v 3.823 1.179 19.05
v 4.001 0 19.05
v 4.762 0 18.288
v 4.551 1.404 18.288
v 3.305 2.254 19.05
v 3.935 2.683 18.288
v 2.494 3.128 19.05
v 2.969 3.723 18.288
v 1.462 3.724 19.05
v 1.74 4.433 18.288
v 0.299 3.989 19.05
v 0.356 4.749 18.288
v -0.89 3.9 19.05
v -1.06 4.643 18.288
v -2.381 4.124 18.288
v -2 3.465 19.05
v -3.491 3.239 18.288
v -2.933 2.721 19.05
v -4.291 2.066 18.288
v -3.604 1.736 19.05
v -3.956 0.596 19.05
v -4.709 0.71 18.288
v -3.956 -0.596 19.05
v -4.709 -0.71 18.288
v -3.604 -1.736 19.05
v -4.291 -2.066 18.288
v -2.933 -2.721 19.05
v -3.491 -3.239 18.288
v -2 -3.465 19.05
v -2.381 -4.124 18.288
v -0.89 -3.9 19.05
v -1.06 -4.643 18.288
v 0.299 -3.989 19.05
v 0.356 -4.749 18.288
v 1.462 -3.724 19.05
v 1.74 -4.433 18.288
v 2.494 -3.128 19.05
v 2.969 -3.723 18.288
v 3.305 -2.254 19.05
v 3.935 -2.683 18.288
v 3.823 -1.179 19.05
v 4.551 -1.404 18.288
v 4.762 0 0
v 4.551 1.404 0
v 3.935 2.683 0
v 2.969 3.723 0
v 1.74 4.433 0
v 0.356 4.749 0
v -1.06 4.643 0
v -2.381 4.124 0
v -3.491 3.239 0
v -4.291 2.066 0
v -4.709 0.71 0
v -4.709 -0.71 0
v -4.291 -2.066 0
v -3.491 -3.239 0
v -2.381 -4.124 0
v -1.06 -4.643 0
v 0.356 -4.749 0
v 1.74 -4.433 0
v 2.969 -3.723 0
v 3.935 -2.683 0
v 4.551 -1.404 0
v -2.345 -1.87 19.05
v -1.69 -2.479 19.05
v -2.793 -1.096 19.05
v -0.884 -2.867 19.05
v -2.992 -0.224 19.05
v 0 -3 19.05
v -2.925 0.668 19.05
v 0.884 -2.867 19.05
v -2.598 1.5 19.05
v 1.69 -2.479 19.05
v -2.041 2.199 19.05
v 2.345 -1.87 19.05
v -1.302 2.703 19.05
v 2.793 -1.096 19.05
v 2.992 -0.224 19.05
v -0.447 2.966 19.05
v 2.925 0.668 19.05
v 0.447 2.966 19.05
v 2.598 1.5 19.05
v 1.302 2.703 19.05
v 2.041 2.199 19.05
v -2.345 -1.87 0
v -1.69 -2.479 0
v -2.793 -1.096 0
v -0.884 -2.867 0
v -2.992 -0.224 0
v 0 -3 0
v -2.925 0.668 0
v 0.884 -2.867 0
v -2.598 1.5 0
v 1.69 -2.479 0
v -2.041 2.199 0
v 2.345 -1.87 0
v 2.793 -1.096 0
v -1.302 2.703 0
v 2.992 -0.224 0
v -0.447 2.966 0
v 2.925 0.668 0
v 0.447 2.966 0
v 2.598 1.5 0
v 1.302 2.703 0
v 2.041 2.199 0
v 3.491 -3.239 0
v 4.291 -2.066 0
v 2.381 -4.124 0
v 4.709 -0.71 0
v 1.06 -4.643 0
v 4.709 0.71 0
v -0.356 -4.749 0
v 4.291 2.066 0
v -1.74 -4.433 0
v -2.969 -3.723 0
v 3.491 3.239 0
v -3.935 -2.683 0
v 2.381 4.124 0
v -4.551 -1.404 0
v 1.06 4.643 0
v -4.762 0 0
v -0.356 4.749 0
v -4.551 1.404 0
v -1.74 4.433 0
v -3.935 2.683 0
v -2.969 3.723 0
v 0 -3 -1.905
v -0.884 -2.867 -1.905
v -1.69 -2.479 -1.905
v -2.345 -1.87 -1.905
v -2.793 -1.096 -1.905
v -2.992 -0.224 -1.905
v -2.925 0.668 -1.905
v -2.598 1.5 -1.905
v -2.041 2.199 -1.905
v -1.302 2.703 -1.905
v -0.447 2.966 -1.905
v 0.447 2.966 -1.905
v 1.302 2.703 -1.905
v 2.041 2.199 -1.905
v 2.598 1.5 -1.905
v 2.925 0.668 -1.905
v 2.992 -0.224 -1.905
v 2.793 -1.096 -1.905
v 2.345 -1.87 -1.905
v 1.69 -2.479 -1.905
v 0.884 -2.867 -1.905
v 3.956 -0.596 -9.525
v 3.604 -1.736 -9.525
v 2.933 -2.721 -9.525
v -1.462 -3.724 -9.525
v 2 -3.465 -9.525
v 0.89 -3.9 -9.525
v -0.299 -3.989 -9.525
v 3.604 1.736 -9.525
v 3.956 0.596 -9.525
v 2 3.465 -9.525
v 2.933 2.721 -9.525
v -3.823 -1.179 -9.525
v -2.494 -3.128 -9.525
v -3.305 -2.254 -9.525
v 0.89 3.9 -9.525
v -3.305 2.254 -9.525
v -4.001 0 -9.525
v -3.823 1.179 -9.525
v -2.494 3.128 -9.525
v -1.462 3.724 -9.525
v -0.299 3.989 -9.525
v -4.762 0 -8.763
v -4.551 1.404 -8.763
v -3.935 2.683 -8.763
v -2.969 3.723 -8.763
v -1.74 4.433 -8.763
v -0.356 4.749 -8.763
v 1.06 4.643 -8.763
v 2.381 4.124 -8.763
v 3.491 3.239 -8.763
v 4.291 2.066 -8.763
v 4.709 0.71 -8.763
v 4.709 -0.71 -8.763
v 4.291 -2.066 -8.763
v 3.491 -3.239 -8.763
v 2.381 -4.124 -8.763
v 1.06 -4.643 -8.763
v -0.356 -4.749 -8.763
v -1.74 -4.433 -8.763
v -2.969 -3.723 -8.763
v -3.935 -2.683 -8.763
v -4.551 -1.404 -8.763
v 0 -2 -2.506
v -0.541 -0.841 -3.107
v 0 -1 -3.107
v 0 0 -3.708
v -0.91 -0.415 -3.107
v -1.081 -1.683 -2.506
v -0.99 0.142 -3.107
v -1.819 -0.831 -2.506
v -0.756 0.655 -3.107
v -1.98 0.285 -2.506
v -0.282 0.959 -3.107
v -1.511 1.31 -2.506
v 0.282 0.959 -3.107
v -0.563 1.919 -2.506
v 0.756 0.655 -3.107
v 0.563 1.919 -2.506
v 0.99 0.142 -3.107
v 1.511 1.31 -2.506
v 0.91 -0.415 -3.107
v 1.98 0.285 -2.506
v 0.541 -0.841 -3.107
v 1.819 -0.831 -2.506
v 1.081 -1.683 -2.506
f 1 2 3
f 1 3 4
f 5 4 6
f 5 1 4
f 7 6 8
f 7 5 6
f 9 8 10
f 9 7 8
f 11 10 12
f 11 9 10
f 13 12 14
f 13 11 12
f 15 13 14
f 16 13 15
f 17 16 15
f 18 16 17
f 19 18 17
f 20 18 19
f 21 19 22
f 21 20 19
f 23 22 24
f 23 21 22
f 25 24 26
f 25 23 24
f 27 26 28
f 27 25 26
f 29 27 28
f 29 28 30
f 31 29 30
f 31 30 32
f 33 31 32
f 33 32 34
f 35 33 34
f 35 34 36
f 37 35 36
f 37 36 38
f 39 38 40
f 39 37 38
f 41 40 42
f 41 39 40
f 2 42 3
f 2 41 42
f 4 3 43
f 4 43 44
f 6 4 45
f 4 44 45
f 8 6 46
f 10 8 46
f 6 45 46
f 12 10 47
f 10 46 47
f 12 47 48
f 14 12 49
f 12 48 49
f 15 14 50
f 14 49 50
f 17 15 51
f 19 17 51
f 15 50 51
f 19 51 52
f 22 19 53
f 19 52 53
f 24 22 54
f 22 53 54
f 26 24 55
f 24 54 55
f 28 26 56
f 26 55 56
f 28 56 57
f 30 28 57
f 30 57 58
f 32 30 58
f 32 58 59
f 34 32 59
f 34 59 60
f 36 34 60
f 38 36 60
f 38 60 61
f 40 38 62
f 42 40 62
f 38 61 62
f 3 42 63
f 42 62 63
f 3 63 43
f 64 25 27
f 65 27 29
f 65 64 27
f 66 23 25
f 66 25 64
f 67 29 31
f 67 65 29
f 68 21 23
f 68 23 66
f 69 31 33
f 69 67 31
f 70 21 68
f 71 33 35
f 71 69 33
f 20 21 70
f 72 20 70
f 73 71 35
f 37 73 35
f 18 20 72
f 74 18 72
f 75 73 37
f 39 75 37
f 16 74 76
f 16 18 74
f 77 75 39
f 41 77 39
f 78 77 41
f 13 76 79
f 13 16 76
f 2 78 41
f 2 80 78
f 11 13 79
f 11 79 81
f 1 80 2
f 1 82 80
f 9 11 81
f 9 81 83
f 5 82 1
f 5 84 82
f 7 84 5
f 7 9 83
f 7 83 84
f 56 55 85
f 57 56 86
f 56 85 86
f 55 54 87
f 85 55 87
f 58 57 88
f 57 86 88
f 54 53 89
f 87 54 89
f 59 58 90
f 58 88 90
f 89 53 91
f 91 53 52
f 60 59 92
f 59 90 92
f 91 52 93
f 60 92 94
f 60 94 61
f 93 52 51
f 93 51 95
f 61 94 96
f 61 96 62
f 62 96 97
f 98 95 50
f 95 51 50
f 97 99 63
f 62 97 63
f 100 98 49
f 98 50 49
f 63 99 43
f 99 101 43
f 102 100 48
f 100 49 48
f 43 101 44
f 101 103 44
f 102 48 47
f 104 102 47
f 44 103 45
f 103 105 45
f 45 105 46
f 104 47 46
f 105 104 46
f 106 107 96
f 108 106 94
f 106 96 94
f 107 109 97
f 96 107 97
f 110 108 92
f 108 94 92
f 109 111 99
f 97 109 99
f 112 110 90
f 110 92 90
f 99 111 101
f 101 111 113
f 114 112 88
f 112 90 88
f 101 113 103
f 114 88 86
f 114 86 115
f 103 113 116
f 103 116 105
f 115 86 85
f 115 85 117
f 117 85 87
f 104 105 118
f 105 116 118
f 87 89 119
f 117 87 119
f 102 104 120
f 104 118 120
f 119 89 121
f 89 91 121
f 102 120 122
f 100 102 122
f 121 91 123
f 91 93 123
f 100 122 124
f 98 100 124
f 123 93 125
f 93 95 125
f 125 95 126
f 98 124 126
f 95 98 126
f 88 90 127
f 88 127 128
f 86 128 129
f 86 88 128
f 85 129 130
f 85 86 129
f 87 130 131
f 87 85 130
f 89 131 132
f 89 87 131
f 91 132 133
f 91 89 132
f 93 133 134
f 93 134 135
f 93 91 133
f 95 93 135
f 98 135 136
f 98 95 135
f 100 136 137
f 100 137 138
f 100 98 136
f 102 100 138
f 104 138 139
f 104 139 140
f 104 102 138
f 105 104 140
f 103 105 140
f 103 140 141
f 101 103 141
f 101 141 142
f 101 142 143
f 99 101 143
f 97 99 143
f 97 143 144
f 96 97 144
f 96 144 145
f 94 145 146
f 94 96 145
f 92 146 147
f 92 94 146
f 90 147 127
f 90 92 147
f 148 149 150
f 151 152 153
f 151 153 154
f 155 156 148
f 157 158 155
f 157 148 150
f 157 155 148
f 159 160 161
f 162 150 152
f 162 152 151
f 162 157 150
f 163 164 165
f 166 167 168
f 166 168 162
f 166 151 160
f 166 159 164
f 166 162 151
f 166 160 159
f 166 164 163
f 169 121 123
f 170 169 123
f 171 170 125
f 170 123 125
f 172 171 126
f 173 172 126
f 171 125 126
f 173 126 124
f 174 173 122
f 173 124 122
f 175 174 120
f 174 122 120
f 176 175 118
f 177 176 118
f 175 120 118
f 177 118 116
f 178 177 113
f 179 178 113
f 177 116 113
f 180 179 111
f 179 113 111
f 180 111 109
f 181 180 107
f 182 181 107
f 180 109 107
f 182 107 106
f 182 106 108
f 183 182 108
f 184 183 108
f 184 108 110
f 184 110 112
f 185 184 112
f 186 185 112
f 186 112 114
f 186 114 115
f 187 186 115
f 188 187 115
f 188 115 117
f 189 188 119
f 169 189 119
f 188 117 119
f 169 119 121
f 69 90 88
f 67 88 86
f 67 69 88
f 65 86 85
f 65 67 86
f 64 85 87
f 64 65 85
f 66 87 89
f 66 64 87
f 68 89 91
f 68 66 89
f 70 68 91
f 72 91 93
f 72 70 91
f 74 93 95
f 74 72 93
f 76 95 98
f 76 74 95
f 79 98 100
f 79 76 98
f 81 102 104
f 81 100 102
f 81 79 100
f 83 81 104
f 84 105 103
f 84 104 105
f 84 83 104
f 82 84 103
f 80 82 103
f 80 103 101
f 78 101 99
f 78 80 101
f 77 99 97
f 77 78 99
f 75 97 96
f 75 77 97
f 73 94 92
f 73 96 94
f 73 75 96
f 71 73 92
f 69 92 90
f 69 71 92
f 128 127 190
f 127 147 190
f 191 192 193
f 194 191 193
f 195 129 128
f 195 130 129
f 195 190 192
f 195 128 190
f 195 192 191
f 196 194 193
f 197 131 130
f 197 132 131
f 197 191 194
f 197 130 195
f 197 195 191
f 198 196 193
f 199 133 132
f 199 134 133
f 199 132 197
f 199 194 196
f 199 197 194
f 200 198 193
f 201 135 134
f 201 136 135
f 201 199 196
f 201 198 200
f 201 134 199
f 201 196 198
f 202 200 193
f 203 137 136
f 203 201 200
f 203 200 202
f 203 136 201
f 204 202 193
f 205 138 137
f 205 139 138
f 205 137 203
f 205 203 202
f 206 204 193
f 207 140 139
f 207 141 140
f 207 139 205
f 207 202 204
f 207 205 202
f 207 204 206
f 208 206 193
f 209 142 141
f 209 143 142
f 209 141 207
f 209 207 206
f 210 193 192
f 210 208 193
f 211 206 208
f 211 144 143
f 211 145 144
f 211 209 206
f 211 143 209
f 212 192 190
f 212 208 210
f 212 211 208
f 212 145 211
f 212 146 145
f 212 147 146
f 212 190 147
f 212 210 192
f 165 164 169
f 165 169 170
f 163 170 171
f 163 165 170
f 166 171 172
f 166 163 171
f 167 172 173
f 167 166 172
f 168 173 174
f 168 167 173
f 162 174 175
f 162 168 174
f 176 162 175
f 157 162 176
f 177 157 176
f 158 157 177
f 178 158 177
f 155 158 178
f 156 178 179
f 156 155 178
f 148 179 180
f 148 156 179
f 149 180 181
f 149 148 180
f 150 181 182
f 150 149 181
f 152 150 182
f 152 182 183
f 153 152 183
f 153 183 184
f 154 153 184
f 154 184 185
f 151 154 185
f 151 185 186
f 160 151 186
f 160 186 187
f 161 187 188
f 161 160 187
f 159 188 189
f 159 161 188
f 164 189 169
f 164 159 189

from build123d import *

# Parameters (mm, degrees)
SKETCH1_R               = 4.7625
SIDE_WITH_HOLE_DEPTH    = 19.05
SKETCH2_R               = 4.7625
SIDE_WITHOUT_HOLE_DEPTH = 9.525
CHAMFER1_SIZE           = 0.762
CHAMFER2_SIZE           = 0.762


with BuildPart() as part:
    # Sketch1 → Side With Hole (new body)
    with BuildSketch(Plane.XY):
        Circle(SKETCH1_R)
    extrude(amount=SIDE_WITH_HOLE_DEPTH)


with BuildPart() as body_2:
    # Sketch2 → Side Without Hole (new body)
    with BuildSketch(Plane(origin=(0, 0, 0), x_dir=(-1, 0, 0), z_dir=(0, 0, -1))):
        Circle(SKETCH2_R)
    extrude(amount=SIDE_WITHOUT_HOLE_DEPTH)


with BuildPart() as f_6_0_6_diameter_hole1_tool:
    # Sketch4 → Ø6.0 (6) Diameter Hole1 (revolve)
    with BuildSketch(Plane(origin=(0, 0, 19.05), x_dir=(0, -1, 0), z_dir=(1, 0, 0))):
        Polygon((0, 0), (0, 22.757581857), (3, 20.955), (3, 0), align=None)
    revolve(axis=Axis((0, 0, 25.4), (0, 0, -1)))


with BuildPart() as part_1:
    add(part.part)

    # Ø6.0 (6) Diameter Hole1: cut by f_6_0_6_diameter_hole1_tool
    add(f_6_0_6_diameter_hole1_tool.part, mode=Mode.SUBTRACT)

    # Chamfer2
    chamfer2_edges = [part_1.edges().sort_by_distance(p)[0] for p in [
        (-4.7625, 0, 19.05),
    ]]
    chamfer(chamfer2_edges, length=CHAMFER2_SIZE)


with BuildPart() as body_2_1:
    add(body_2.part)

    # Ø6.0 (6) Diameter Hole1: cut by f_6_0_6_diameter_hole1_tool
    add(f_6_0_6_diameter_hole1_tool.part, mode=Mode.SUBTRACT)

    # Chamfer1
    chamfer1_edges = [body_2_1.edges().sort_by_distance(p)[0] for p in [
        (4.7625, 0, -9.525),
    ]]
    chamfer(chamfer1_edges, length=CHAMFER1_SIZE)


solid = Compound([part_1.part, body_2_1.part])
